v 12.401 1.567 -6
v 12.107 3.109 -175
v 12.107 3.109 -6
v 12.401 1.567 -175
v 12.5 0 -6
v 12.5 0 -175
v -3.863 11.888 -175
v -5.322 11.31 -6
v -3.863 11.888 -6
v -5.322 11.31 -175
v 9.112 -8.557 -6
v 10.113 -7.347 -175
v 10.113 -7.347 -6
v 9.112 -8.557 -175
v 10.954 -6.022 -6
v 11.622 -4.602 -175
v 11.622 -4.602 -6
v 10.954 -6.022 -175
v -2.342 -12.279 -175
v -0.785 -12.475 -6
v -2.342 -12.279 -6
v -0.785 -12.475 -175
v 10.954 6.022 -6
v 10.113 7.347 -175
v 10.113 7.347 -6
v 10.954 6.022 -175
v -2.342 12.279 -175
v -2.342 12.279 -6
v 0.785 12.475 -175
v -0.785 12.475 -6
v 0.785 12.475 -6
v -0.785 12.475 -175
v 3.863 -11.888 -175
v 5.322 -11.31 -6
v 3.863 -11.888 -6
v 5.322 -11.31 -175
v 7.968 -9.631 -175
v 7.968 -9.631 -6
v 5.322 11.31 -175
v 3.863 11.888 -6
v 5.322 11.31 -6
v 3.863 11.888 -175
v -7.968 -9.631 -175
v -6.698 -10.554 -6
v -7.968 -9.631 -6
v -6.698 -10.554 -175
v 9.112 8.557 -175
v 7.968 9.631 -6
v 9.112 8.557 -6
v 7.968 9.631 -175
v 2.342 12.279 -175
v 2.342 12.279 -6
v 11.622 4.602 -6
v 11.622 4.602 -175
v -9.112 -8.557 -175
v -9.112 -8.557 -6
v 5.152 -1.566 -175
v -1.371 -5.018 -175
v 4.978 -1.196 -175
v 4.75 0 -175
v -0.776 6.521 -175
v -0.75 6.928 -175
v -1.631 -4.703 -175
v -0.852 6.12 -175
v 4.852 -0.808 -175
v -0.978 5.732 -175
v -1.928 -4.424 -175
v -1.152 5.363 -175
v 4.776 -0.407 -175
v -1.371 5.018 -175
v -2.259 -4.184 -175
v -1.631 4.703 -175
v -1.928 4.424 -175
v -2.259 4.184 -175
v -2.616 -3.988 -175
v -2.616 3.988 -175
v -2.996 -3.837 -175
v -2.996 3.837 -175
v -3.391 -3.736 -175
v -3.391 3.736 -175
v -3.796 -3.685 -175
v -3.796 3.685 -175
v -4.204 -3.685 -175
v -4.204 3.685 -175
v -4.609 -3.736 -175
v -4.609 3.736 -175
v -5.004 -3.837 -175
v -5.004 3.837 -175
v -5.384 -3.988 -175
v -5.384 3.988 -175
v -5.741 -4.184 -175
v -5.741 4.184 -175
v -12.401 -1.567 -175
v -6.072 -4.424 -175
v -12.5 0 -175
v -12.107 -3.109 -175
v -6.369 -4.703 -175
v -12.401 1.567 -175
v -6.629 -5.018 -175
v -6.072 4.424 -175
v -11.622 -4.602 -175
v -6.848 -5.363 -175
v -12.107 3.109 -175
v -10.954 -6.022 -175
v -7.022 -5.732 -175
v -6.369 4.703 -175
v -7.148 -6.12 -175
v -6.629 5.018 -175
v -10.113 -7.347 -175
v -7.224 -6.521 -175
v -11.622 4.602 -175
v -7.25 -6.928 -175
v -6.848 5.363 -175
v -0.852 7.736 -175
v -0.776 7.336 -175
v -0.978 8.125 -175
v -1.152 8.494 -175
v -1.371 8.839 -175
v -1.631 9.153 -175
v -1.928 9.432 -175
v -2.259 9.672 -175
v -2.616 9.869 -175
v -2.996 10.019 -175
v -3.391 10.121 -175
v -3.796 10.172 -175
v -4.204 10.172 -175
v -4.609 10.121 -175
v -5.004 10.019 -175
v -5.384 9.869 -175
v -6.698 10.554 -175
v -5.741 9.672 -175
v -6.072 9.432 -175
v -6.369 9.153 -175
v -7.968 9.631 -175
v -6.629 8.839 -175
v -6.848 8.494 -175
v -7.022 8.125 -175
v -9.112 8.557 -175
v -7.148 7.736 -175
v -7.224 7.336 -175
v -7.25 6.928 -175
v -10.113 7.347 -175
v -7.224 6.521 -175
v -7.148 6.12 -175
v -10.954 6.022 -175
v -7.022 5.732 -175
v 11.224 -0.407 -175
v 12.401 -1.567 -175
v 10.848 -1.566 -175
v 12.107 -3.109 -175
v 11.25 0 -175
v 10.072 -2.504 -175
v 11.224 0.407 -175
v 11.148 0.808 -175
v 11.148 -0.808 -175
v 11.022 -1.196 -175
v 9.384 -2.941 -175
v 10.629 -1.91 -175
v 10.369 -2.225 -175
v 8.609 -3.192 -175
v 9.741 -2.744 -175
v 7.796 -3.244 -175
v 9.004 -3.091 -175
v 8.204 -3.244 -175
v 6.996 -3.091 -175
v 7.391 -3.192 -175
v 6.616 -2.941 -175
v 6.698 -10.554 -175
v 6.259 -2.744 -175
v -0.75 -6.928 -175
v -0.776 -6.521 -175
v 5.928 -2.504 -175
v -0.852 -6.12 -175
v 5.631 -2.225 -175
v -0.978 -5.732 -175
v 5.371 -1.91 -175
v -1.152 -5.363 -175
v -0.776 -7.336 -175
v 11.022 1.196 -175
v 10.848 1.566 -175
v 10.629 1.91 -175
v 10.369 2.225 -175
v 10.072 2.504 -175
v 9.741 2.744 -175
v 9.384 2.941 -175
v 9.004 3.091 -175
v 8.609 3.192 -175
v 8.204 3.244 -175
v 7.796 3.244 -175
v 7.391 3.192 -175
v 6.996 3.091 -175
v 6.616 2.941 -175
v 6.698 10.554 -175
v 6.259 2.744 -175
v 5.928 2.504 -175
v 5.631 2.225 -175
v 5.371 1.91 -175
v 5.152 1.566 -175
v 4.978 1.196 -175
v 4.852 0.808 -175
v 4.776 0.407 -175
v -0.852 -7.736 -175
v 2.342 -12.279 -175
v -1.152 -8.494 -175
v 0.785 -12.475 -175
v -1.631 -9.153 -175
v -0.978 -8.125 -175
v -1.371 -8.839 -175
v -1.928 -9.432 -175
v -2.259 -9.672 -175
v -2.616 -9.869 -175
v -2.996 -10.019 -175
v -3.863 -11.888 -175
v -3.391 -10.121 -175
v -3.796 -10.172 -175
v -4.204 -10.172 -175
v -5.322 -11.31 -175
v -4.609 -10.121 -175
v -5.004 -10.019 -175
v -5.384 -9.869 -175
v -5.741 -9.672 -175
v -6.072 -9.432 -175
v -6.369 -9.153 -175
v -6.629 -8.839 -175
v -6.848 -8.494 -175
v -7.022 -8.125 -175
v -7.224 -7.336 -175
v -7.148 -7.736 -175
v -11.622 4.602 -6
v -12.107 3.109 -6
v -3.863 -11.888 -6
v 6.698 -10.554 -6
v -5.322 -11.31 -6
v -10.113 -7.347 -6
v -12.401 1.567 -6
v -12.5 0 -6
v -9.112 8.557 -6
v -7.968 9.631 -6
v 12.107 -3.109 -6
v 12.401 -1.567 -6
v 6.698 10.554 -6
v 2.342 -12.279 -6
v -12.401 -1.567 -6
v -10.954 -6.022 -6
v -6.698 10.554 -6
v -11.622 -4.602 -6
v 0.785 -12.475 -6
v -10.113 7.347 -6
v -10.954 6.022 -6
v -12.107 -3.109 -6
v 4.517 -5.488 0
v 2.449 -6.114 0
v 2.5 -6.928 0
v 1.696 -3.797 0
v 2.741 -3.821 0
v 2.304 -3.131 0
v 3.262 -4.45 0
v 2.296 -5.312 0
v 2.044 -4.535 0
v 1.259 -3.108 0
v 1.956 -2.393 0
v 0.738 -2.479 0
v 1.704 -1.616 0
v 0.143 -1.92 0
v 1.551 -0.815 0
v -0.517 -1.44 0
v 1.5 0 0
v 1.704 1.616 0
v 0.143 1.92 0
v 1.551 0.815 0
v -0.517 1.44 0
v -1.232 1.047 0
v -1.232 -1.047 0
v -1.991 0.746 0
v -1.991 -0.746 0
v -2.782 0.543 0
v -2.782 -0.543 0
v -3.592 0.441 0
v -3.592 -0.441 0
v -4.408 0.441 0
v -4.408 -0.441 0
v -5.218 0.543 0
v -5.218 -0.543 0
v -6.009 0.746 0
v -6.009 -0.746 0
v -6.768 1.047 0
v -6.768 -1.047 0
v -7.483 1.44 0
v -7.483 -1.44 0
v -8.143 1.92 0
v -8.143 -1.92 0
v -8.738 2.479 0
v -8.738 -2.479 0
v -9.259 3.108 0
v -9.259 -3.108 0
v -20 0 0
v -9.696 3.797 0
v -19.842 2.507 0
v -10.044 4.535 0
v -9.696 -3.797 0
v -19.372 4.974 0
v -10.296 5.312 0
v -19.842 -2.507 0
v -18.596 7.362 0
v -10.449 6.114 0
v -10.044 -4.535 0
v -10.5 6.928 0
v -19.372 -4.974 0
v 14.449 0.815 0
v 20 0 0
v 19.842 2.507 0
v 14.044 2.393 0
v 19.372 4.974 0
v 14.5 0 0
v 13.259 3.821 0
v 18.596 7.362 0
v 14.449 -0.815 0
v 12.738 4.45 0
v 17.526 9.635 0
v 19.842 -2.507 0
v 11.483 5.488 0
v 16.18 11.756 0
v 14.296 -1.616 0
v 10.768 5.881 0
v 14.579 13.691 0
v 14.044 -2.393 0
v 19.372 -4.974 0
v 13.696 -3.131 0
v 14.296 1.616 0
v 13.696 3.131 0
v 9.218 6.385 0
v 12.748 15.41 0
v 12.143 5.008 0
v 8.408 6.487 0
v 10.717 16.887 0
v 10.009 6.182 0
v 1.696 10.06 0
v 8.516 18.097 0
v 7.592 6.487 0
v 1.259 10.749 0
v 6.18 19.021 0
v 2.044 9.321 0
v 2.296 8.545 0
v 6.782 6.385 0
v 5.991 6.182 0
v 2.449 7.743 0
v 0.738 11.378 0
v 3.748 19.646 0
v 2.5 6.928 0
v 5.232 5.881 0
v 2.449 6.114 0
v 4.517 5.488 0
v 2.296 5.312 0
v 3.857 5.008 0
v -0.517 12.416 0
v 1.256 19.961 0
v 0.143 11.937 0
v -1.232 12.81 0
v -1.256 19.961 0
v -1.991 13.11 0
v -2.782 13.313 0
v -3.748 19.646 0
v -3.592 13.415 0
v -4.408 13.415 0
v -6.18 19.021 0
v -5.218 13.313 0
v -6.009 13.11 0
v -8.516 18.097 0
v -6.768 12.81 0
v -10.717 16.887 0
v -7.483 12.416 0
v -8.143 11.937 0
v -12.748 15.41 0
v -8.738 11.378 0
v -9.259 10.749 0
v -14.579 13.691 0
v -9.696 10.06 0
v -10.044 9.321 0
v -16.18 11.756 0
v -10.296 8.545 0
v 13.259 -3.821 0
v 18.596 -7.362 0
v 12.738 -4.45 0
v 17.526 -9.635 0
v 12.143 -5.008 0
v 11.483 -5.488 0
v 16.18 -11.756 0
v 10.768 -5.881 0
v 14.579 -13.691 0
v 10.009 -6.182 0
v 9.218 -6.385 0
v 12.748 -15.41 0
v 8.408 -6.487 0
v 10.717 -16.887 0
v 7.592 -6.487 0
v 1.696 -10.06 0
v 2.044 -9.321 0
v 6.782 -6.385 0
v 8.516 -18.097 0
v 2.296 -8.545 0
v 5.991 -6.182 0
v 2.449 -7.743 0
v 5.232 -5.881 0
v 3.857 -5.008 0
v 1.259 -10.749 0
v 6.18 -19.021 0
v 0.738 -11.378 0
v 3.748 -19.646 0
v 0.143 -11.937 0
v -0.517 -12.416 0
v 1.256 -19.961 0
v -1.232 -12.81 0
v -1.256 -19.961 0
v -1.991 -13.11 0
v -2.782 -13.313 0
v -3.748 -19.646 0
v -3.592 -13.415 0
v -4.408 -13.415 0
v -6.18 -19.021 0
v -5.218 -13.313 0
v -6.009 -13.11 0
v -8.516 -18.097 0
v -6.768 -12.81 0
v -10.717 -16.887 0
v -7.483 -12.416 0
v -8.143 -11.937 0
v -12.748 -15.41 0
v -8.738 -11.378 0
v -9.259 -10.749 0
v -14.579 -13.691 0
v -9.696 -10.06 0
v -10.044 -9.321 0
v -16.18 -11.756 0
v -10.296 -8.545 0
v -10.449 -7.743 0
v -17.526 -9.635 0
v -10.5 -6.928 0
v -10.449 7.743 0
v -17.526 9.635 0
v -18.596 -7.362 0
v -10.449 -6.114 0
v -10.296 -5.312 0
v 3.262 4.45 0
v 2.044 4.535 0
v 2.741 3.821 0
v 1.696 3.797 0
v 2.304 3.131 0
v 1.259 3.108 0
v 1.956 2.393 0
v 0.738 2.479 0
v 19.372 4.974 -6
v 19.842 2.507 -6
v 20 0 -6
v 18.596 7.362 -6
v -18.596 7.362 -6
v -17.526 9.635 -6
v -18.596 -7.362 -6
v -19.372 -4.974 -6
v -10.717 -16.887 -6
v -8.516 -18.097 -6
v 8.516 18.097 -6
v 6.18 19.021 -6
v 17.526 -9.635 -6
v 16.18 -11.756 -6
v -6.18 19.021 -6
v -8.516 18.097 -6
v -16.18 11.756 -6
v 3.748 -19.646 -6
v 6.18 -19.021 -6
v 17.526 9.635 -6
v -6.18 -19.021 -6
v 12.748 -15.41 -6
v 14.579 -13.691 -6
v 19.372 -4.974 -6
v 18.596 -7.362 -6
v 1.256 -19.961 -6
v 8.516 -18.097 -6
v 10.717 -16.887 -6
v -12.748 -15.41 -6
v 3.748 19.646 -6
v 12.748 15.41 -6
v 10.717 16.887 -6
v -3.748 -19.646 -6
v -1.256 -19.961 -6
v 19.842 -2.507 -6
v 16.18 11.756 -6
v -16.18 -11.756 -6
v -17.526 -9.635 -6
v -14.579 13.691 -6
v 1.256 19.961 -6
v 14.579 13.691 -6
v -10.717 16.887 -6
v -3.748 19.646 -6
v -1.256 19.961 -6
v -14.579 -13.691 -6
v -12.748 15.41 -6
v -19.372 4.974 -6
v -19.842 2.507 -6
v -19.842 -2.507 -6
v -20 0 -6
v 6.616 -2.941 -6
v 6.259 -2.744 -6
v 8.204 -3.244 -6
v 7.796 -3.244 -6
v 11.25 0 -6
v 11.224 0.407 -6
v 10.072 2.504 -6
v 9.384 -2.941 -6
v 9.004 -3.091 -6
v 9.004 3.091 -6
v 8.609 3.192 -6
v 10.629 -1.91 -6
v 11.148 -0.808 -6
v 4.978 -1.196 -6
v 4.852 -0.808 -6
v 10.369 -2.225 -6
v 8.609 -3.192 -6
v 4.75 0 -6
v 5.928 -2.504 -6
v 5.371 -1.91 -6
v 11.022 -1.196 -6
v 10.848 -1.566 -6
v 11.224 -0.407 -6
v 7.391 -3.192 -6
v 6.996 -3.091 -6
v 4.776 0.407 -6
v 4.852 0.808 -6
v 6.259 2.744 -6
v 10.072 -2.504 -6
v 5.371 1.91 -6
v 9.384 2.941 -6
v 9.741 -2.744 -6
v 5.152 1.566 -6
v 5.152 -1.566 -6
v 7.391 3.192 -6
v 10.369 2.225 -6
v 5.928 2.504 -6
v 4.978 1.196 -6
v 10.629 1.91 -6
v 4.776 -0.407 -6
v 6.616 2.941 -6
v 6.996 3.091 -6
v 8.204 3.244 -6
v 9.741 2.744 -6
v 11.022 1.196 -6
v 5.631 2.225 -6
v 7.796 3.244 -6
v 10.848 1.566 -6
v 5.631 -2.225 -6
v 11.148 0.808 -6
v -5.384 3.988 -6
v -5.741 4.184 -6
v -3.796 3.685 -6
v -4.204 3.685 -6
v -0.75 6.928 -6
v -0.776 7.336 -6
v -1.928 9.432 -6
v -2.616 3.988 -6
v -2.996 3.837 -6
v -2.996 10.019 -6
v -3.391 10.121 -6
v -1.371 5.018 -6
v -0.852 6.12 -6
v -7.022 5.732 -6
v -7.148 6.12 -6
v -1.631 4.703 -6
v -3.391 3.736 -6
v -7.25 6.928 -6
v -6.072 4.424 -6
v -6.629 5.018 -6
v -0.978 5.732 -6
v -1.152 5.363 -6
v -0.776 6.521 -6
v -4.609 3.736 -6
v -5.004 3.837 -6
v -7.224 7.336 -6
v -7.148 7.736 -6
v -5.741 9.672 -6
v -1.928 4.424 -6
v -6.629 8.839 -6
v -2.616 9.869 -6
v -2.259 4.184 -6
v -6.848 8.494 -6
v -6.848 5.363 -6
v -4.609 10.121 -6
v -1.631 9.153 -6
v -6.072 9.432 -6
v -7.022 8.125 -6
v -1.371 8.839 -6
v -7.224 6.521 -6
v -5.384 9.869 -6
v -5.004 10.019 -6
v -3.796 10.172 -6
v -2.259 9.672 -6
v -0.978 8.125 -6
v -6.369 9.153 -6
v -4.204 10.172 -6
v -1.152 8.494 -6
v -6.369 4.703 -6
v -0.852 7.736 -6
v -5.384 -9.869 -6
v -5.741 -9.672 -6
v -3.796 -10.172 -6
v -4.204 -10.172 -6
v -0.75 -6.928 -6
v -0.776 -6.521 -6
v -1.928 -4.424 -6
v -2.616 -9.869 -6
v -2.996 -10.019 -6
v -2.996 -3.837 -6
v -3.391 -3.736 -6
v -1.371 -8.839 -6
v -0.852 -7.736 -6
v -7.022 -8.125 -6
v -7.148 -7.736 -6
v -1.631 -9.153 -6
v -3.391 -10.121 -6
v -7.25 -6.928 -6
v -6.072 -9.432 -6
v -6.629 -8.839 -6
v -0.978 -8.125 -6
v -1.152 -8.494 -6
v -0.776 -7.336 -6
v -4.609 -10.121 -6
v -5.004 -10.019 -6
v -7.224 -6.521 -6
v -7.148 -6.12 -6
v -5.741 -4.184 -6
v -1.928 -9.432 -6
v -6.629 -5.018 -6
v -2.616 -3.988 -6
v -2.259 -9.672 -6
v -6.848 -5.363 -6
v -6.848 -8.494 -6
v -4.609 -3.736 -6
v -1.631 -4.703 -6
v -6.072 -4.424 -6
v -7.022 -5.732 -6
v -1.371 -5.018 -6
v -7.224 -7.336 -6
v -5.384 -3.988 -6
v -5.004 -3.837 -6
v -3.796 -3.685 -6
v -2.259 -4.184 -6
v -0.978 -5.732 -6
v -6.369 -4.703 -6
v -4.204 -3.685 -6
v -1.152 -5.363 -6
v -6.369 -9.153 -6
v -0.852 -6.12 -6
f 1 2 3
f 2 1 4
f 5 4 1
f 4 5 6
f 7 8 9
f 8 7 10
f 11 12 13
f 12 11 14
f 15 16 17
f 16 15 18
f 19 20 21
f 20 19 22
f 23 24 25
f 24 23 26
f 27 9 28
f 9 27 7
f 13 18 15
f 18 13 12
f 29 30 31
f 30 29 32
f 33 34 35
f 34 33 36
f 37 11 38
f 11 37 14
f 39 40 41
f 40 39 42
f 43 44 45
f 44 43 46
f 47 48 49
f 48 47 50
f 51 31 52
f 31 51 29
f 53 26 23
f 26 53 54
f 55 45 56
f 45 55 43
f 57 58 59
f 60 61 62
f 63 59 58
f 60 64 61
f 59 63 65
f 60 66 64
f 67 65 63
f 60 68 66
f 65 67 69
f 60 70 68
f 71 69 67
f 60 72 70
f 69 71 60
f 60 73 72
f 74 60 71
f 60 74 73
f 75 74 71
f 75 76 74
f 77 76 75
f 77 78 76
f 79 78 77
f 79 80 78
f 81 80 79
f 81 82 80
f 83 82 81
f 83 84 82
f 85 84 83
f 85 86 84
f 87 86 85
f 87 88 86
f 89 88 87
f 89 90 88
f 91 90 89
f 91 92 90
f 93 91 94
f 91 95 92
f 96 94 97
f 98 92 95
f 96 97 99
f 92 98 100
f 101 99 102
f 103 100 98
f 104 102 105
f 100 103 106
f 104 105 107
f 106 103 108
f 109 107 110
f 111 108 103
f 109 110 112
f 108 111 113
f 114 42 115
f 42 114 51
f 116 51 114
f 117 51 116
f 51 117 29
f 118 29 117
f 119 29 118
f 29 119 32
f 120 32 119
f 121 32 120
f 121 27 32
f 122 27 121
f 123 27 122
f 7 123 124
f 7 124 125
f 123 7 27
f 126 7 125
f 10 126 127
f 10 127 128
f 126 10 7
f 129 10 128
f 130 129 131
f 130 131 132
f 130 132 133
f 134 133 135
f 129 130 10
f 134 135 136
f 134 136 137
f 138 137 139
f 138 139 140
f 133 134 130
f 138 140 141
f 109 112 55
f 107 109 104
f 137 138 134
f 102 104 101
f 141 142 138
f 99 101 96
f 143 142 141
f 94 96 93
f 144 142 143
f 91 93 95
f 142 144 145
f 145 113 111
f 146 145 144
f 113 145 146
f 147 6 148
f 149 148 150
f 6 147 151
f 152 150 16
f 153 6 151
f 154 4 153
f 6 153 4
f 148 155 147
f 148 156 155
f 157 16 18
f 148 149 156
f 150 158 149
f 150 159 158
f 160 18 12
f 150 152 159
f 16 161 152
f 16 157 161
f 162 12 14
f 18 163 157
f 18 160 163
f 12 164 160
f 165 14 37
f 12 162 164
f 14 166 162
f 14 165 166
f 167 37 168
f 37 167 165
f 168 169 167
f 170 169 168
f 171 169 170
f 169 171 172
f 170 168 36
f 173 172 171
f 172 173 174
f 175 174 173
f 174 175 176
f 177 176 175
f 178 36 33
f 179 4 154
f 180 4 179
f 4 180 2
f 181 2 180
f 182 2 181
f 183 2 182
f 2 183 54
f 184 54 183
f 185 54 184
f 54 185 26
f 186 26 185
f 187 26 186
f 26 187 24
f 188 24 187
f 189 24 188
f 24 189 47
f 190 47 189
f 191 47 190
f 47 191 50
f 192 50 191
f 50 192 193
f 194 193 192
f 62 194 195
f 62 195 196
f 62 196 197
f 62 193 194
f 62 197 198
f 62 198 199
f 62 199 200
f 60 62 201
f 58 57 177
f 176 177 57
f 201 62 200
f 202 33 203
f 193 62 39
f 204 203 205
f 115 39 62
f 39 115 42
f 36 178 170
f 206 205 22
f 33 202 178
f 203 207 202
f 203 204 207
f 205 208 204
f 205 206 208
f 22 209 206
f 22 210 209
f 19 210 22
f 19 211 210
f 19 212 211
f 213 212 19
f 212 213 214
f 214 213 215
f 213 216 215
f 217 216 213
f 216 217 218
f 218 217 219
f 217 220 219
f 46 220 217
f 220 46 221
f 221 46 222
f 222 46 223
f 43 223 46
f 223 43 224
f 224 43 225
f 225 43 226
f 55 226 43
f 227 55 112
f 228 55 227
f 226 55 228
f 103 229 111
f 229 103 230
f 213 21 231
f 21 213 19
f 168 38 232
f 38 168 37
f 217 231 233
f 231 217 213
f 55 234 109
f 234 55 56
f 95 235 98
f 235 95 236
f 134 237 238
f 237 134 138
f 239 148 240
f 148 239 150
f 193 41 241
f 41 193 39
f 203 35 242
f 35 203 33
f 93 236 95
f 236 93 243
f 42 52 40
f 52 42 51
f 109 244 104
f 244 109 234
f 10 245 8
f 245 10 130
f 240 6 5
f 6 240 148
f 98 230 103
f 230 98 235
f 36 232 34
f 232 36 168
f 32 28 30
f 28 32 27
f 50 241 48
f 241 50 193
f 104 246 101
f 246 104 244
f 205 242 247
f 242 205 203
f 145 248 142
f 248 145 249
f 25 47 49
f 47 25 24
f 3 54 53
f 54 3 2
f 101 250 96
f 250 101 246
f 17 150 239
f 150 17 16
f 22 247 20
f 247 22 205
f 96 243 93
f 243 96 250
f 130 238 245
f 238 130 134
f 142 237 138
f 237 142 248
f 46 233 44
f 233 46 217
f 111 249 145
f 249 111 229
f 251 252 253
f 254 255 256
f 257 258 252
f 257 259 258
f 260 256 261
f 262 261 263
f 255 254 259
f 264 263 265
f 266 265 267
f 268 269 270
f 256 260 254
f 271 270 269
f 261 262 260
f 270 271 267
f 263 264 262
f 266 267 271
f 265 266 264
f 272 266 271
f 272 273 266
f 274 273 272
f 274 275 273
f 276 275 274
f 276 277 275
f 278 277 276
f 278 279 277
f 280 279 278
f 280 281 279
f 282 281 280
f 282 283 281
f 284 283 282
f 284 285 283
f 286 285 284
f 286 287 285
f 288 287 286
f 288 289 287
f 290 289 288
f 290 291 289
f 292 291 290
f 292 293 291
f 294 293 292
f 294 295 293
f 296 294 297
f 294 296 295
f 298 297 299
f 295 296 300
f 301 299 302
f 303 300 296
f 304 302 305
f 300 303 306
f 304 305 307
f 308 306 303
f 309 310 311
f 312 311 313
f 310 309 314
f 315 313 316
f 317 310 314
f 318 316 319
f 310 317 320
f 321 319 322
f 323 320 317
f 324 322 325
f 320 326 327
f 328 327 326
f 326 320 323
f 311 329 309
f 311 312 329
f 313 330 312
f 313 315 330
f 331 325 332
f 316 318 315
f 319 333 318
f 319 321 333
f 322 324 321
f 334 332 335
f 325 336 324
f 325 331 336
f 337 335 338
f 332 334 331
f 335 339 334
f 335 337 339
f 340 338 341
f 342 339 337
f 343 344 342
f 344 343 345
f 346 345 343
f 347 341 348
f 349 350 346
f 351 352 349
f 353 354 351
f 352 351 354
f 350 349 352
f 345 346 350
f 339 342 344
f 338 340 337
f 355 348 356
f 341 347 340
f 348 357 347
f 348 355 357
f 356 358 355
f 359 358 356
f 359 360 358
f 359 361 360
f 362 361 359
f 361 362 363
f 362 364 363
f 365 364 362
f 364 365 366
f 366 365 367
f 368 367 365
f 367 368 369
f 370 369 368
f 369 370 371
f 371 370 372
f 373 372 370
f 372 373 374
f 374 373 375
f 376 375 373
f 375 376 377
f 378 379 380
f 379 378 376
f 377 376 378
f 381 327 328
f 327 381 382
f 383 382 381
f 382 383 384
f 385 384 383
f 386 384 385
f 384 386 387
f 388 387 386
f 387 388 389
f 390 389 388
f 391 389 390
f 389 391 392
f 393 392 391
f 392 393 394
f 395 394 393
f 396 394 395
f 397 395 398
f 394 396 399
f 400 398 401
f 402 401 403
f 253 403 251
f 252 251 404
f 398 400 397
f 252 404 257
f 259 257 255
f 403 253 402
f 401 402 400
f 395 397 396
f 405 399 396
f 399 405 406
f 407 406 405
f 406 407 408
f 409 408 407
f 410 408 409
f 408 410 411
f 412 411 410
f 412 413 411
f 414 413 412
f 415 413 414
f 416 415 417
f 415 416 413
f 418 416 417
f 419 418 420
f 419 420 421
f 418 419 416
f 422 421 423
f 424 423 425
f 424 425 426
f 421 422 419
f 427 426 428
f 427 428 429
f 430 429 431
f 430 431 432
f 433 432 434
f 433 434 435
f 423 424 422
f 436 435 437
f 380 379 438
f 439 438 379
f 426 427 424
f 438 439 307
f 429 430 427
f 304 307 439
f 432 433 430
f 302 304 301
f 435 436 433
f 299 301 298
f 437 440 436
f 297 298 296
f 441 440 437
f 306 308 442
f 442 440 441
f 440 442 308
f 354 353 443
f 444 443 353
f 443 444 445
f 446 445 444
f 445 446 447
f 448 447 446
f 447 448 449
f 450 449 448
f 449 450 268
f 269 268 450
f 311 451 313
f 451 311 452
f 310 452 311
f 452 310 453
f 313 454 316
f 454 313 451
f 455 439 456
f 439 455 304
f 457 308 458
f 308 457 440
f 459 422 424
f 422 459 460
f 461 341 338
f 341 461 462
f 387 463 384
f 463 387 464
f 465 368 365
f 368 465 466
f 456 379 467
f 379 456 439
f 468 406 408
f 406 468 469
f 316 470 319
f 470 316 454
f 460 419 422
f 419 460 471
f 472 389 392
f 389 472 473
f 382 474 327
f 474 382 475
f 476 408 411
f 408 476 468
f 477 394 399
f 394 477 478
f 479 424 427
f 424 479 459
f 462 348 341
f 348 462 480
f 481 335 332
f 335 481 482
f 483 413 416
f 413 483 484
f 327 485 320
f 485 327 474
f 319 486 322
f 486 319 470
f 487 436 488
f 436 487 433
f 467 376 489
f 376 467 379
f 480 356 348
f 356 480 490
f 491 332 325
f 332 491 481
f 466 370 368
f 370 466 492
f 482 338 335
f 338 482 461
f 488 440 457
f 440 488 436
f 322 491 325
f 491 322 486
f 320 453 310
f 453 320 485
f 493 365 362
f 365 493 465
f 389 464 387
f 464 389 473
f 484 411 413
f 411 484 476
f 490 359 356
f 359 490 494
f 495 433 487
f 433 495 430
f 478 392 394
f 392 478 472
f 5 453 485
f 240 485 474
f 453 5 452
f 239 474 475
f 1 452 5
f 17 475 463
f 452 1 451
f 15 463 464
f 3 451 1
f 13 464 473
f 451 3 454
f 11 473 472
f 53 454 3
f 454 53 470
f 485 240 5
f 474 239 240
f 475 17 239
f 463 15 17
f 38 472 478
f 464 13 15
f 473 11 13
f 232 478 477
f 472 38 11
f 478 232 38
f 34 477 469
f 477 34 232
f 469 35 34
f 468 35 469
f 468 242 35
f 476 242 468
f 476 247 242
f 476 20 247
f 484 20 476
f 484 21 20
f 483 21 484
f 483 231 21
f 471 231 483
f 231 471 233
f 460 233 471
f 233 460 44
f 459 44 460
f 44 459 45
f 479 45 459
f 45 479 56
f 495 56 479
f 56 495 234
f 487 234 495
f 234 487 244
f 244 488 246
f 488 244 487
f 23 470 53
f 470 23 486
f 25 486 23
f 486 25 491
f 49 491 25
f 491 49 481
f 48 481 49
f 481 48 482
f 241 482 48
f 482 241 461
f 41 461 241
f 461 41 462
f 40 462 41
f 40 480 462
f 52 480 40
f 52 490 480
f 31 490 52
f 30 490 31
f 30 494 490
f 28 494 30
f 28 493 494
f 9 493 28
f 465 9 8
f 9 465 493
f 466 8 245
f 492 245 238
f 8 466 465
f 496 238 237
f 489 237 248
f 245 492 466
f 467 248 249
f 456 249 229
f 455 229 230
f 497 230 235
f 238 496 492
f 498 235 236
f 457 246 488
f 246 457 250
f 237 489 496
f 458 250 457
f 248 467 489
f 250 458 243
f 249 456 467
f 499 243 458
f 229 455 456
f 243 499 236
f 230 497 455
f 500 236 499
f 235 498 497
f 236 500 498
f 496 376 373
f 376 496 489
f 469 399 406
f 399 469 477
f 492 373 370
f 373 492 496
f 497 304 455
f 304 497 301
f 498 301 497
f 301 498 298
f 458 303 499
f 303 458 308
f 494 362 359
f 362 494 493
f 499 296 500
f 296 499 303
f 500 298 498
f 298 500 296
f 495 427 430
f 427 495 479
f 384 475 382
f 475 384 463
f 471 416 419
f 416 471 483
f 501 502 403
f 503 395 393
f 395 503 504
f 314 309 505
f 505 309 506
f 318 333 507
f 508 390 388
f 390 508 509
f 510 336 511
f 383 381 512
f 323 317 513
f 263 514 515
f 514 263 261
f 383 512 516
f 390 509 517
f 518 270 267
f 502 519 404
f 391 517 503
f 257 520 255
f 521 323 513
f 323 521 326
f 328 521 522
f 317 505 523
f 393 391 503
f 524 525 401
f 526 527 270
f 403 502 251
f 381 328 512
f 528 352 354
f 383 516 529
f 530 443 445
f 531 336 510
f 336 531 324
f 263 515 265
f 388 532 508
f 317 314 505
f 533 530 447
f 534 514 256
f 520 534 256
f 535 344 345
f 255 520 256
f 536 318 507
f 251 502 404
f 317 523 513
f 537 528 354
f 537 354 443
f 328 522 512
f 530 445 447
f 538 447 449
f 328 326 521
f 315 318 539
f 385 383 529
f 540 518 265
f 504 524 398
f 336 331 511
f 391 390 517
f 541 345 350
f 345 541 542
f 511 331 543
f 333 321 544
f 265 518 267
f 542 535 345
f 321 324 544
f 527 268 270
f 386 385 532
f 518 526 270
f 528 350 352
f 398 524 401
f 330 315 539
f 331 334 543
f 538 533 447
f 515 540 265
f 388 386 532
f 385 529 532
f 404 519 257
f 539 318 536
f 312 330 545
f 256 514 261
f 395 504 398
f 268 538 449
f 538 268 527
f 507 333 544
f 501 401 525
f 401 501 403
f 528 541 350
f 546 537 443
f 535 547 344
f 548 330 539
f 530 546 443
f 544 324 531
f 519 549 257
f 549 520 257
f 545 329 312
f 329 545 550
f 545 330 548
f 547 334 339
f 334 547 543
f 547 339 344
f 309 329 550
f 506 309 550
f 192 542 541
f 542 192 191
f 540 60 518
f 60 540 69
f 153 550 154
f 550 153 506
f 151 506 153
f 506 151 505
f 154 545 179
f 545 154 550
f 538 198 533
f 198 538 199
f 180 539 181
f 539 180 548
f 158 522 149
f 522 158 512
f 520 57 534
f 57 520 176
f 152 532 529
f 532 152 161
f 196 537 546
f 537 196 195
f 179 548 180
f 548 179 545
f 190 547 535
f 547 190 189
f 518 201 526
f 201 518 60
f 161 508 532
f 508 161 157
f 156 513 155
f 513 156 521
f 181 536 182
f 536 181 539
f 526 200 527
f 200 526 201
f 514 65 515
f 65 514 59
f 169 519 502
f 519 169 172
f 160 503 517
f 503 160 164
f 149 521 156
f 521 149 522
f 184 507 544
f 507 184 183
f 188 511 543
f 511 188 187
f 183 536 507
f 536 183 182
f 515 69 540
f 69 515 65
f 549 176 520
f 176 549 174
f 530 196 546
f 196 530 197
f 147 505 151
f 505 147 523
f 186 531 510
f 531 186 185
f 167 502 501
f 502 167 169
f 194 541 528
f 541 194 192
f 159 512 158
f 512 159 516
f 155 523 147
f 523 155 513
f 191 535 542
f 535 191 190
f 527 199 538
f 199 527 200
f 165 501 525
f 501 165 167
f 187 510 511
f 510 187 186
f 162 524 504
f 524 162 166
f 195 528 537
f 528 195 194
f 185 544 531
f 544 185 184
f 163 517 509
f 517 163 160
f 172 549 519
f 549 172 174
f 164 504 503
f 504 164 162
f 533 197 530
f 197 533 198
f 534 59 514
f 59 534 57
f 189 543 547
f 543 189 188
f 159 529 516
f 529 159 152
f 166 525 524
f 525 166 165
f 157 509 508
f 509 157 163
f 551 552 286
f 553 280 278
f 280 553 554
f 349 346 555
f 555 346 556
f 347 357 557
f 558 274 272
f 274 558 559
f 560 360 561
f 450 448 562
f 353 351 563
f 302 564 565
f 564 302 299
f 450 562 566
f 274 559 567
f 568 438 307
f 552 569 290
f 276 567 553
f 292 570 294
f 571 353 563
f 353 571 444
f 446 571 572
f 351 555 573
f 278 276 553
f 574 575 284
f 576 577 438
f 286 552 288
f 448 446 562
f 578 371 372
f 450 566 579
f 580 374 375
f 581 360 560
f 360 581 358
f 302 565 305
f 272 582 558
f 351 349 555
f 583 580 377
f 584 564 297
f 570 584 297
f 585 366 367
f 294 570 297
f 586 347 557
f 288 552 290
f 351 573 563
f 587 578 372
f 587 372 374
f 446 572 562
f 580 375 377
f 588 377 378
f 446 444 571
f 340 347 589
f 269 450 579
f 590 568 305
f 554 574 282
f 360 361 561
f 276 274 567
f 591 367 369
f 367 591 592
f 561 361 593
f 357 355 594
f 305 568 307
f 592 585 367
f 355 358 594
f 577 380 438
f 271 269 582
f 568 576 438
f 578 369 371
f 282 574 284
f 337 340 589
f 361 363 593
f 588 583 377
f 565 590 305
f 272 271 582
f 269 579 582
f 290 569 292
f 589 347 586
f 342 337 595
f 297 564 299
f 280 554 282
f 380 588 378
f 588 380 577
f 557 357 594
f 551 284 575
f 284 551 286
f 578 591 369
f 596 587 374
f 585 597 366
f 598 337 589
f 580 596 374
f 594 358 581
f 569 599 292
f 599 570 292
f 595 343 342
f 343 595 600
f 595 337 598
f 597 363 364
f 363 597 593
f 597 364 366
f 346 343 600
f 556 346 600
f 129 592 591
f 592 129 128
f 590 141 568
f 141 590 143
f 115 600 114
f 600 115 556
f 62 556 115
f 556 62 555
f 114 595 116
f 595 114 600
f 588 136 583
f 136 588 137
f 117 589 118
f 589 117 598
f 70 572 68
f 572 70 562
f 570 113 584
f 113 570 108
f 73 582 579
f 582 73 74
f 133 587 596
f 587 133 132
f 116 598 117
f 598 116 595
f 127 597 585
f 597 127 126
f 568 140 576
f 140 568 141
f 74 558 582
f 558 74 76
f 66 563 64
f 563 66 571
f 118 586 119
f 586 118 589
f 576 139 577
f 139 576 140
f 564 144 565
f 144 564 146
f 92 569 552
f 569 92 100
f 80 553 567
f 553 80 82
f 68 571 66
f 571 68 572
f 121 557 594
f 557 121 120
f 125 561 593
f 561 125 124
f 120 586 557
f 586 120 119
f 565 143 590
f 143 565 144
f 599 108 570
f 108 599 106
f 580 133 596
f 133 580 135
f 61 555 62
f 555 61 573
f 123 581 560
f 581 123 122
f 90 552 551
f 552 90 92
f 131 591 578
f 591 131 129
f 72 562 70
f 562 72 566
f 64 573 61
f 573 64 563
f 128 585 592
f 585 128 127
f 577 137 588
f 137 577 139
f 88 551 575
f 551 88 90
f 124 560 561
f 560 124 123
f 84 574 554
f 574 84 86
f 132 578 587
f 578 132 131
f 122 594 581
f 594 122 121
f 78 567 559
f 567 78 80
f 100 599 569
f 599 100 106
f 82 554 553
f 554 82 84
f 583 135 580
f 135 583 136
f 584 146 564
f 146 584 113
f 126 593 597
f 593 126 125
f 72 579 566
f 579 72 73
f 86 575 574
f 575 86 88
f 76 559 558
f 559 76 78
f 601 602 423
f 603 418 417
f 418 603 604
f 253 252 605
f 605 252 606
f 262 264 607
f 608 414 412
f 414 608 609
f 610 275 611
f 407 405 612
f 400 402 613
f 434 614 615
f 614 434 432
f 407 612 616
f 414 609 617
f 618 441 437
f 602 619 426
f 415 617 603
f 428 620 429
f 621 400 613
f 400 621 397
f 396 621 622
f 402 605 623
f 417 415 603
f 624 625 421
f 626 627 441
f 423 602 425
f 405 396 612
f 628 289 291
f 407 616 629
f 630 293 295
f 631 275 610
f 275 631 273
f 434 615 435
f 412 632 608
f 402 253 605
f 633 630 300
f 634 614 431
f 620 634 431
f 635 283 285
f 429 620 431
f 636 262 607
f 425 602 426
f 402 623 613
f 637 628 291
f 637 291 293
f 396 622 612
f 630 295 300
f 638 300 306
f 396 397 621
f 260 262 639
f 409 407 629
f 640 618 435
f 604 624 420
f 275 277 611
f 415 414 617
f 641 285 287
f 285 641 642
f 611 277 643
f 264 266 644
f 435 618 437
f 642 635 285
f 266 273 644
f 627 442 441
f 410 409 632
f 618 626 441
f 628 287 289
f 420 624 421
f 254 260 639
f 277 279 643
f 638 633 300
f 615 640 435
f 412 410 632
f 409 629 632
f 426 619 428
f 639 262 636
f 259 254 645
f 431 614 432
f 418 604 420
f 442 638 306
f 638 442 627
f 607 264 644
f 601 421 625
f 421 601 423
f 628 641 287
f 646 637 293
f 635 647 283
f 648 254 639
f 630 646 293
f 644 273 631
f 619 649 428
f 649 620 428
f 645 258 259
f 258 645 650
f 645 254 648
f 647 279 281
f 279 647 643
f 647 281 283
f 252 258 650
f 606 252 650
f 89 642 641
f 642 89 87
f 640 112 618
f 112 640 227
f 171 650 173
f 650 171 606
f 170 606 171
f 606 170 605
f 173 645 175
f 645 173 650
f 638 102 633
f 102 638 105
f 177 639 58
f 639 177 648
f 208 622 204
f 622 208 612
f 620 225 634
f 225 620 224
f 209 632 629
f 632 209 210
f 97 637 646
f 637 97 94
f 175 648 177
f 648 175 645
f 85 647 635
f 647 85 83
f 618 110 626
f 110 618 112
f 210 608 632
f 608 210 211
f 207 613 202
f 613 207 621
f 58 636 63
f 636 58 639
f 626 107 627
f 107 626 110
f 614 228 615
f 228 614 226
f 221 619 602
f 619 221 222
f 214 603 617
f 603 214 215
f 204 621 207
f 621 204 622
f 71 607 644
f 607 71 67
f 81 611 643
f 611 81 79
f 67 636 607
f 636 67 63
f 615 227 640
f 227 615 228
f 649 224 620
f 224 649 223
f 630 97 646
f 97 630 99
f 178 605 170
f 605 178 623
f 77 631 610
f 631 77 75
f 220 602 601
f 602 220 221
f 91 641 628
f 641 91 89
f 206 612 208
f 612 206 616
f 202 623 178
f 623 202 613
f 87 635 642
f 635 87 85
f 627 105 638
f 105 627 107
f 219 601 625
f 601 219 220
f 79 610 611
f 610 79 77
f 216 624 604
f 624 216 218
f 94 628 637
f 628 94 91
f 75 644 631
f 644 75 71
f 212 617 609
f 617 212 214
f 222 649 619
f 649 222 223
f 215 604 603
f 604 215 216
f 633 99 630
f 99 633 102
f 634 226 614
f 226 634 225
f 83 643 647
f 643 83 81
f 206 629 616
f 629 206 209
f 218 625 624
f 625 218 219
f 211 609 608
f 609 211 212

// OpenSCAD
$fn = 50;


difference() {
	union() {
		translate(v = [0, 0, -175.0000000000]) {
			cylinder(h = 175, r = 12.5000000000);
		}
		translate(v = [0, 0, -6.0000000000]) {
			cylinder(h = 6, r = 20.0000000000);
		}
	}
	union() {
		translate(v = [8.0000000000, 0.0000000000, 0]) {
			rotate(a = [0, 0, 0]) {
				difference() {
					union() {
						#translate(v = [0, 0, -175.0000000000]) {
							cylinder(h = 175, r = 2.2500000000);
						}
						#translate(v = [0, 0, -6]) {
							cylinder(h = 6, r = 12.5000000000, r1 = 3.2500000000, r2 = 6.5000000000);
						}
						#translate(v = [0, 0, -175.0000000000]) {
							cylinder(h = 175, r = 3.2500000000);
						}
						#translate(v = [0, 0, -175.0000000000]) {
							cylinder(h = 175, r = 2.2500000000);
						}
					}
					union();
				}
			}
		}
		translate(v = [-4.0000000000, 6.9282032303, 0]) {
			rotate(a = [0, 0, 0]) {
				difference() {
					union() {
						#translate(v = [0, 0, -175.0000000000]) {
							cylinder(h = 175, r = 2.2500000000);
						}
						#translate(v = [0, 0, -6]) {
							cylinder(h = 6, r = 12.5000000000, r1 = 3.2500000000, r2 = 6.5000000000);
						}
						#translate(v = [0, 0, -175.0000000000]) {
							cylinder(h = 175, r = 3.2500000000);
						}
						#translate(v = [0, 0, -175.0000000000]) {
							cylinder(h = 175, r = 2.2500000000);
						}
					}
					union();
				}
			}
		}
		translate(v = [-4.0000000000, -6.9282032303, 0]) {
			rotate(a = [0, 0, 0]) {
				difference() {
					union() {
						#translate(v = [0, 0, -175.0000000000]) {
							cylinder(h = 175, r = 2.2500000000);
						}
						#translate(v = [0, 0, -6]) {
							cylinder(h = 6, r = 12.5000000000, r1 = 3.2500000000, r2 = 6.5000000000);
						}
						#translate(v = [0, 0, -175.0000000000]) {
							cylinder(h = 175, r = 3.2500000000);
						}
						#translate(v = [0, 0, -175.0000000000]) {
							cylinder(h = 175, r = 2.2500000000);
						}
					}
					union();
				}
			}
		}
	}
}
